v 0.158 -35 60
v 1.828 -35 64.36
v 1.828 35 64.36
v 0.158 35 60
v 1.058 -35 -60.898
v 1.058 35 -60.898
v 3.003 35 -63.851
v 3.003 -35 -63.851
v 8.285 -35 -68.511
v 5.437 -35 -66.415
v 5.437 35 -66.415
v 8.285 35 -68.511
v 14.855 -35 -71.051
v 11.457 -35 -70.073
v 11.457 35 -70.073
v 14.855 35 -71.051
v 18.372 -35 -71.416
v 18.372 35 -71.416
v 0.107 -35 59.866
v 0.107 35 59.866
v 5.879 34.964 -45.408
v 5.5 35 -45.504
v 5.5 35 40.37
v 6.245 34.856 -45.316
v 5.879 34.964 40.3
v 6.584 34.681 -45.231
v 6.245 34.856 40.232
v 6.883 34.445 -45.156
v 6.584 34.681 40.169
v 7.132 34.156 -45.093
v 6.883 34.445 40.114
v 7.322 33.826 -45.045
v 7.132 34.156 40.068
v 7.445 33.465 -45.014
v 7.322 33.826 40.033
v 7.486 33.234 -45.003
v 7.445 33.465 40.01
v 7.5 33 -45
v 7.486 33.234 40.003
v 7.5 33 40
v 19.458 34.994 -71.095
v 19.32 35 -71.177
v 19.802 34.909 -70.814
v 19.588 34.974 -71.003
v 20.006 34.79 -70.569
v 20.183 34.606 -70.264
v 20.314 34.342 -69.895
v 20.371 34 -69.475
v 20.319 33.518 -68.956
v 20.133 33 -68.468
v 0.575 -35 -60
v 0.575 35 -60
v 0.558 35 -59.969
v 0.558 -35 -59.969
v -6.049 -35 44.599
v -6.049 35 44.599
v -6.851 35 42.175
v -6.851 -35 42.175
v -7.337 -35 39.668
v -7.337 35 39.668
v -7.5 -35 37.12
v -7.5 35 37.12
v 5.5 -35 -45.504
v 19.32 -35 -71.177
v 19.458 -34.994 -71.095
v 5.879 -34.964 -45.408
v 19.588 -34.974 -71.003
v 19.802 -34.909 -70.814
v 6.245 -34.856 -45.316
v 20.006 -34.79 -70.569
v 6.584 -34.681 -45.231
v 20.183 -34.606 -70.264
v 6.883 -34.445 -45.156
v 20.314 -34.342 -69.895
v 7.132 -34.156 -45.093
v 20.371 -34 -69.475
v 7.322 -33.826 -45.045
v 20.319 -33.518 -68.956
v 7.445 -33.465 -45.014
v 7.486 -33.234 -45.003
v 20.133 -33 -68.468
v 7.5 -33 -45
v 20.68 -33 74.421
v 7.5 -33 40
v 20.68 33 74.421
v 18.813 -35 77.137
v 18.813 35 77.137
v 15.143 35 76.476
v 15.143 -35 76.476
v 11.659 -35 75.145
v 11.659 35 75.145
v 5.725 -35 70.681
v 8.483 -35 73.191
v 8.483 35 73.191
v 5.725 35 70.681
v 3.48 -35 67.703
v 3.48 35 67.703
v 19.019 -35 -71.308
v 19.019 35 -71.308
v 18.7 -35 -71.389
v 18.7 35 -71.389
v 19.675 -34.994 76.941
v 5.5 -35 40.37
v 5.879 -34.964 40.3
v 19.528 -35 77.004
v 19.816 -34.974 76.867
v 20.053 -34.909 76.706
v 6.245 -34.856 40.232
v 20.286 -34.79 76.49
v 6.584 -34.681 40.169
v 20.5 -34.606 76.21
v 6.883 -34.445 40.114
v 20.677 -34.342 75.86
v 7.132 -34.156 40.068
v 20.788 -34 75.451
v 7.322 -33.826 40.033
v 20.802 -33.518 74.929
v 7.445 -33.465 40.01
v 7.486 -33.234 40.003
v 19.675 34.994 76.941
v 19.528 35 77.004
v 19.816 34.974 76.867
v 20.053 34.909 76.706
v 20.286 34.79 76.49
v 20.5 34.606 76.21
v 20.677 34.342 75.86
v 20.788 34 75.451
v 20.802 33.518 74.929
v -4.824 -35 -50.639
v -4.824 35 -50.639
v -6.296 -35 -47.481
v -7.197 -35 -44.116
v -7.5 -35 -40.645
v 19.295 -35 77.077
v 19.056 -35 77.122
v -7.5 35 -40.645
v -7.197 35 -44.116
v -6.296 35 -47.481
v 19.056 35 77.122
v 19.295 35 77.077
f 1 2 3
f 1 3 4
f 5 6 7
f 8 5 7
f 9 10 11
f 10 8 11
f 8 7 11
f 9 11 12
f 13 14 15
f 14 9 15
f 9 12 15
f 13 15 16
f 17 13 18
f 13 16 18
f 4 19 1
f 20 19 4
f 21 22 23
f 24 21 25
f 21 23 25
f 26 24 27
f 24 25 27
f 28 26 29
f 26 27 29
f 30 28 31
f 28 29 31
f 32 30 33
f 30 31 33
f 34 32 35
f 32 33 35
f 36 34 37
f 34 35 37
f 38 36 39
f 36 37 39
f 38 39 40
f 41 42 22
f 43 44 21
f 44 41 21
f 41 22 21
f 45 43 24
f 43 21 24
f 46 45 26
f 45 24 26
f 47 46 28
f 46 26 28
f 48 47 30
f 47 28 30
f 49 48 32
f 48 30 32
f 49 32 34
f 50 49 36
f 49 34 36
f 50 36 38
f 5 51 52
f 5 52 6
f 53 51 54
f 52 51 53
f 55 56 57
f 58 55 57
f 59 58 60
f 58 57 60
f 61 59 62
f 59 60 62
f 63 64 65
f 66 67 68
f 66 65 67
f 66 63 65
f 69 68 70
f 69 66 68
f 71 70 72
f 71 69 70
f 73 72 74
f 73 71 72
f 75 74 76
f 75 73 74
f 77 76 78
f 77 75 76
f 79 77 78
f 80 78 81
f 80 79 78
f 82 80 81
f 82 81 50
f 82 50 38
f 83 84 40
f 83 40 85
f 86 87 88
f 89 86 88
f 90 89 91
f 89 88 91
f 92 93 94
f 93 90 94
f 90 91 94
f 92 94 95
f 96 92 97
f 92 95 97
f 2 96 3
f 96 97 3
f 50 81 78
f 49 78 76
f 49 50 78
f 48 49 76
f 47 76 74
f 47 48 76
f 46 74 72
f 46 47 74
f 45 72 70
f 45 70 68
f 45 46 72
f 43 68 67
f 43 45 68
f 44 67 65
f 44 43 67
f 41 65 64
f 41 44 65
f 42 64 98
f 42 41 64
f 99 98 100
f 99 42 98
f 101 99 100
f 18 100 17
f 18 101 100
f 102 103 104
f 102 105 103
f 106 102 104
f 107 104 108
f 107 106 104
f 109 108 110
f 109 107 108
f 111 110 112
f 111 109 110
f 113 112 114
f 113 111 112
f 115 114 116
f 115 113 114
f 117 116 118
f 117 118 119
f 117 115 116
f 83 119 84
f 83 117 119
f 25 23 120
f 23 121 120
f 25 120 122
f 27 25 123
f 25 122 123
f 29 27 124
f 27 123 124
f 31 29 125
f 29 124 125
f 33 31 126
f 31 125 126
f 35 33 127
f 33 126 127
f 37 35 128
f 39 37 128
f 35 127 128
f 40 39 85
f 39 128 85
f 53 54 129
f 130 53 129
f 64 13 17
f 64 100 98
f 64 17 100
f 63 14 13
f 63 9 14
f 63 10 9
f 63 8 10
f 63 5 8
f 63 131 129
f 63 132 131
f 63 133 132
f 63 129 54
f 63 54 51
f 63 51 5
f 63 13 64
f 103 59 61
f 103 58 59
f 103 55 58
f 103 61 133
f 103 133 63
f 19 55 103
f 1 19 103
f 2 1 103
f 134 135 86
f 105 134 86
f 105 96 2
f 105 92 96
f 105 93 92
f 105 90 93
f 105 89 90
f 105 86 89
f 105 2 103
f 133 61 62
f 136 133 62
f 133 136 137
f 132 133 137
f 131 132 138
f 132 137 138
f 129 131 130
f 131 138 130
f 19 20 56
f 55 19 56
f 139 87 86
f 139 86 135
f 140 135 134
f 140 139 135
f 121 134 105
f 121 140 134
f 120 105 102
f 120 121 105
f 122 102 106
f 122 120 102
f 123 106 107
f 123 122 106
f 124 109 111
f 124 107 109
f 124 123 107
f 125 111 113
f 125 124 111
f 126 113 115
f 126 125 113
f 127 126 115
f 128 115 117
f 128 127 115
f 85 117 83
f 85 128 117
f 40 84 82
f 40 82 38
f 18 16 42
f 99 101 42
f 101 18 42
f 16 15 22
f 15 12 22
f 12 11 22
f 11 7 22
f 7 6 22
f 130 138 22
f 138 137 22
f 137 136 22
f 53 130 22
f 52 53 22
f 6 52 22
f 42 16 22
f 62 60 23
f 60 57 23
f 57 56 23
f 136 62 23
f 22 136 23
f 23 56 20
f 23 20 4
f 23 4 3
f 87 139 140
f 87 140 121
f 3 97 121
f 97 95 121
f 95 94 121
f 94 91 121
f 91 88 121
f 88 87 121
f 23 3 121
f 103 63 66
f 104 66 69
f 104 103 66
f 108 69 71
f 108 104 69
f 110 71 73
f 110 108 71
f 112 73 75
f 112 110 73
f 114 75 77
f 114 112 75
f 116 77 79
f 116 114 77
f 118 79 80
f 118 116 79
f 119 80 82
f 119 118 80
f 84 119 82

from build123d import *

# Parameters (mm, degrees)
F0_W        = 70
F0_H        = 120
F1_DEPTH    = 7.5
F3_DEPTH    = 70
F4_T4_DEPTH = 168.5345436458
F5_T4_DEPTH = 142.4389014281
F6_R        = 2
F7_T1_DEPTH = 89.4016367136
F7_T3_DEPTH = 96.7750960728
F7_T5_DEPTH = 138.4048613392
F7_T7_DEPTH = 129.7242953335


# Not quite as in the source:
# - a fillet or chamfer that OpenCascade refuses, or shapes differently, is made with other operations: its cross-section is extruded or revolved along the edge and cut away or added


with BuildPart() as f1:
    # F0 (on Right) → F1 (new body, symmetric)
    with BuildSketch(Plane.YZ):
        Rectangle(F0_W, F0_H)
    extrude(amount=F1_DEPTH, both=True)

    # F2 (on face) → F3 (join)
    with BuildSketch(Plane.XZ.offset(35)):
        Polygon((6.7201238232, 77.1365826446), (-7.5, 40), (7.5, 40), (21.7201238232, 77.1365826446), align=None)
        Polygon((7.5, -45), (-7.5, -45), (6.7201238232, -71.4156786483), (21.7201238232, -71.4156786483), align=None)
    extrude(amount=-F3_DEPTH)

    # F4: chamfer of 19 x 7.661 on 1 edges, made by hand


with BuildPart() as f4_tool2:
    # F4_s3 → F4_t4 (new body)
    with BuildSketch(Plane.XZ.offset(-84.2672718229)):
        Polygon((0.161, 60), (-7.5, 41), (-7.5, 60), align=None)
    extrude(amount=F4_T4_DEPTH)

    split(bisect_by=Plane(origin=(-19.8989220202, 0, 7.6195792646), x_dir=(0, 1, 0), z_dir=(-0.933876884, 0, 0.3575946945)), keep=Keep.TOP)


with BuildPart() as f1_1:
    add(f1.part)

    # F4_t1: cut F4_tool2
    add(f4_tool2.part, mode=Mode.SUBTRACT)

    # F5: chamfer of 8.076 x 14 on 1 edges, made by hand


with BuildPart() as f5_tool2:
    # F5_s3 → F5_t4 (new body)
    with BuildSketch(Plane.XZ.offset(71.219450714)):
        Polygon((0.576, -60), (-7.5, -46), (-7.5, -60), align=None)
    extrude(amount=-F5_T4_DEPTH)

    split(bisect_by=Plane(origin=(-24.5966117165, 0, -13.2408812545), x_dir=(0, 1, 0), z_dir=(-0.8805226216, 0, -0.4740041274)), keep=Keep.TOP)


with BuildPart() as f1_2:
    add(f1_1.part)

    # F5_t1: cut F5_tool2
    add(f5_tool2.part, mode=Mode.SUBTRACT)

    # F6
    f6_edges = [f1_2.edges().sort_by_distance(p)[0] for p in [
        (14.610062, -35, 58.568291),
        (7.5, -35, -2.5),
        (14.610062, -35, -58.207839),
        (14.610062, 35, -58.207839),
        (7.5, 35, -2.5),
        (14.610062, 35, 58.568291),
        (21.720124, 0, 77.136583),
        (21.720124, 0, -71.415679),
    ]]
    fillet(f6_edges, radius=F6_R)

    # F7: fillet of radius 20 on 4 edges, made by hand

    # F7_s2 → F7_t1 (cut)
    with BuildSketch(Plane.XZ.offset(-44.7008183568)):
        with BuildLine():
            ThreePointArc((-6.0489277422, 44.5987955748), (-7.1338808548, 40.9289668935), (-7.5, 37.1196726573))
            Line((-7.5, 37.1196726573), (-7.9, 37.1196726573))
            Line((-7.9, 37.1196726573), (-7.9, 41.0776065469))
            Line((-7.9, 41.0776065469), (-6.419906297, 44.7483780332))
            Line((-6.419906297, 44.7483780332), (-6.0489277422, 44.5987955748))
        make_face()
    extrude(amount=F7_T1_DEPTH, mode=Mode.SUBTRACT)

    # F7_s4 → F7_t3 (cut)
    with BuildSketch(Plane.XZ.offset(-48.3875480364)):
        with BuildLine():
            ThreePointArc((-7.5, -40.6449807854), (-6.8194736284, -45.8177884102), (-4.8242061277, -50.6385728345))
            Line((-4.8242061277, -50.6385728345), (-5.1706902503, -50.8384446755))
            Line((-5.1706902503, -50.8384446755), (-7.9, -46.1071003843))
            Line((-7.9, -46.1071003843), (-7.9, -40.6449807854))
            Line((-7.9, -40.6449807854), (-7.5, -40.6449807854))
        make_face()
    extrude(amount=F7_T3_DEPTH, mode=Mode.SUBTRACT)

    # F7_s6 → F7_t5 (cut)
    with BuildSketch(Plane.XZ.offset(-69.2024306696)):
        with BuildLine():
            ThreePointArc((18.8126855564, 77.1365826446), (8.4827015625, 73.1912821466), (1.8278807245, 64.3602388931))
            Line((1.8278807245, 64.3602388931), (1.4543299709, 64.5032767709))
            Line((1.4543299709, 64.5032767709), (6.3465730696, 77.2796205224))
            Line((6.3465730696, 77.2796205224), (6.7201238232, 77.5365826446))
            ThreePointArc((6.7201238232, 77.5365826446), (12.7664046898, 77.5365826446), (18.7788308995, 77.5351473974))
            Line((18.7788308995, 77.5351473974), (18.8126855564, 77.1365826446))
        make_face()
    extrude(amount=F7_T5_DEPTH, mode=Mode.SUBTRACT)

    # F7_s8 → F7_t7 (cut)
    with BuildSketch(Plane.XZ.offset(-64.8621476667)):
        with BuildLine():
            ThreePointArc((1.0582113239, -60.8979600281), (8.2849802368, -68.5111251687), (18.3721027929, -71.4156786483))
            Line((18.3721027929, -71.4156786483), (18.3661715736, -71.8156346717))
            ThreePointArc((18.3661715736, -71.8156346717), (12.546113308, -71.8156786483), (6.7201238232, -71.8156786483))
            Line((6.7201238232, -71.8156786483), (6.3679147746, -71.6052802993))
            Line((6.3679147746, -71.6052802993), (0.7060022753, -61.0875616791))
            Line((0.7060022753, -61.0875616791), (1.0582113239, -60.8979600281))
        make_face()
    extrude(amount=F7_T7_DEPTH, mode=Mode.SUBTRACT)


solid = f1_2.part
